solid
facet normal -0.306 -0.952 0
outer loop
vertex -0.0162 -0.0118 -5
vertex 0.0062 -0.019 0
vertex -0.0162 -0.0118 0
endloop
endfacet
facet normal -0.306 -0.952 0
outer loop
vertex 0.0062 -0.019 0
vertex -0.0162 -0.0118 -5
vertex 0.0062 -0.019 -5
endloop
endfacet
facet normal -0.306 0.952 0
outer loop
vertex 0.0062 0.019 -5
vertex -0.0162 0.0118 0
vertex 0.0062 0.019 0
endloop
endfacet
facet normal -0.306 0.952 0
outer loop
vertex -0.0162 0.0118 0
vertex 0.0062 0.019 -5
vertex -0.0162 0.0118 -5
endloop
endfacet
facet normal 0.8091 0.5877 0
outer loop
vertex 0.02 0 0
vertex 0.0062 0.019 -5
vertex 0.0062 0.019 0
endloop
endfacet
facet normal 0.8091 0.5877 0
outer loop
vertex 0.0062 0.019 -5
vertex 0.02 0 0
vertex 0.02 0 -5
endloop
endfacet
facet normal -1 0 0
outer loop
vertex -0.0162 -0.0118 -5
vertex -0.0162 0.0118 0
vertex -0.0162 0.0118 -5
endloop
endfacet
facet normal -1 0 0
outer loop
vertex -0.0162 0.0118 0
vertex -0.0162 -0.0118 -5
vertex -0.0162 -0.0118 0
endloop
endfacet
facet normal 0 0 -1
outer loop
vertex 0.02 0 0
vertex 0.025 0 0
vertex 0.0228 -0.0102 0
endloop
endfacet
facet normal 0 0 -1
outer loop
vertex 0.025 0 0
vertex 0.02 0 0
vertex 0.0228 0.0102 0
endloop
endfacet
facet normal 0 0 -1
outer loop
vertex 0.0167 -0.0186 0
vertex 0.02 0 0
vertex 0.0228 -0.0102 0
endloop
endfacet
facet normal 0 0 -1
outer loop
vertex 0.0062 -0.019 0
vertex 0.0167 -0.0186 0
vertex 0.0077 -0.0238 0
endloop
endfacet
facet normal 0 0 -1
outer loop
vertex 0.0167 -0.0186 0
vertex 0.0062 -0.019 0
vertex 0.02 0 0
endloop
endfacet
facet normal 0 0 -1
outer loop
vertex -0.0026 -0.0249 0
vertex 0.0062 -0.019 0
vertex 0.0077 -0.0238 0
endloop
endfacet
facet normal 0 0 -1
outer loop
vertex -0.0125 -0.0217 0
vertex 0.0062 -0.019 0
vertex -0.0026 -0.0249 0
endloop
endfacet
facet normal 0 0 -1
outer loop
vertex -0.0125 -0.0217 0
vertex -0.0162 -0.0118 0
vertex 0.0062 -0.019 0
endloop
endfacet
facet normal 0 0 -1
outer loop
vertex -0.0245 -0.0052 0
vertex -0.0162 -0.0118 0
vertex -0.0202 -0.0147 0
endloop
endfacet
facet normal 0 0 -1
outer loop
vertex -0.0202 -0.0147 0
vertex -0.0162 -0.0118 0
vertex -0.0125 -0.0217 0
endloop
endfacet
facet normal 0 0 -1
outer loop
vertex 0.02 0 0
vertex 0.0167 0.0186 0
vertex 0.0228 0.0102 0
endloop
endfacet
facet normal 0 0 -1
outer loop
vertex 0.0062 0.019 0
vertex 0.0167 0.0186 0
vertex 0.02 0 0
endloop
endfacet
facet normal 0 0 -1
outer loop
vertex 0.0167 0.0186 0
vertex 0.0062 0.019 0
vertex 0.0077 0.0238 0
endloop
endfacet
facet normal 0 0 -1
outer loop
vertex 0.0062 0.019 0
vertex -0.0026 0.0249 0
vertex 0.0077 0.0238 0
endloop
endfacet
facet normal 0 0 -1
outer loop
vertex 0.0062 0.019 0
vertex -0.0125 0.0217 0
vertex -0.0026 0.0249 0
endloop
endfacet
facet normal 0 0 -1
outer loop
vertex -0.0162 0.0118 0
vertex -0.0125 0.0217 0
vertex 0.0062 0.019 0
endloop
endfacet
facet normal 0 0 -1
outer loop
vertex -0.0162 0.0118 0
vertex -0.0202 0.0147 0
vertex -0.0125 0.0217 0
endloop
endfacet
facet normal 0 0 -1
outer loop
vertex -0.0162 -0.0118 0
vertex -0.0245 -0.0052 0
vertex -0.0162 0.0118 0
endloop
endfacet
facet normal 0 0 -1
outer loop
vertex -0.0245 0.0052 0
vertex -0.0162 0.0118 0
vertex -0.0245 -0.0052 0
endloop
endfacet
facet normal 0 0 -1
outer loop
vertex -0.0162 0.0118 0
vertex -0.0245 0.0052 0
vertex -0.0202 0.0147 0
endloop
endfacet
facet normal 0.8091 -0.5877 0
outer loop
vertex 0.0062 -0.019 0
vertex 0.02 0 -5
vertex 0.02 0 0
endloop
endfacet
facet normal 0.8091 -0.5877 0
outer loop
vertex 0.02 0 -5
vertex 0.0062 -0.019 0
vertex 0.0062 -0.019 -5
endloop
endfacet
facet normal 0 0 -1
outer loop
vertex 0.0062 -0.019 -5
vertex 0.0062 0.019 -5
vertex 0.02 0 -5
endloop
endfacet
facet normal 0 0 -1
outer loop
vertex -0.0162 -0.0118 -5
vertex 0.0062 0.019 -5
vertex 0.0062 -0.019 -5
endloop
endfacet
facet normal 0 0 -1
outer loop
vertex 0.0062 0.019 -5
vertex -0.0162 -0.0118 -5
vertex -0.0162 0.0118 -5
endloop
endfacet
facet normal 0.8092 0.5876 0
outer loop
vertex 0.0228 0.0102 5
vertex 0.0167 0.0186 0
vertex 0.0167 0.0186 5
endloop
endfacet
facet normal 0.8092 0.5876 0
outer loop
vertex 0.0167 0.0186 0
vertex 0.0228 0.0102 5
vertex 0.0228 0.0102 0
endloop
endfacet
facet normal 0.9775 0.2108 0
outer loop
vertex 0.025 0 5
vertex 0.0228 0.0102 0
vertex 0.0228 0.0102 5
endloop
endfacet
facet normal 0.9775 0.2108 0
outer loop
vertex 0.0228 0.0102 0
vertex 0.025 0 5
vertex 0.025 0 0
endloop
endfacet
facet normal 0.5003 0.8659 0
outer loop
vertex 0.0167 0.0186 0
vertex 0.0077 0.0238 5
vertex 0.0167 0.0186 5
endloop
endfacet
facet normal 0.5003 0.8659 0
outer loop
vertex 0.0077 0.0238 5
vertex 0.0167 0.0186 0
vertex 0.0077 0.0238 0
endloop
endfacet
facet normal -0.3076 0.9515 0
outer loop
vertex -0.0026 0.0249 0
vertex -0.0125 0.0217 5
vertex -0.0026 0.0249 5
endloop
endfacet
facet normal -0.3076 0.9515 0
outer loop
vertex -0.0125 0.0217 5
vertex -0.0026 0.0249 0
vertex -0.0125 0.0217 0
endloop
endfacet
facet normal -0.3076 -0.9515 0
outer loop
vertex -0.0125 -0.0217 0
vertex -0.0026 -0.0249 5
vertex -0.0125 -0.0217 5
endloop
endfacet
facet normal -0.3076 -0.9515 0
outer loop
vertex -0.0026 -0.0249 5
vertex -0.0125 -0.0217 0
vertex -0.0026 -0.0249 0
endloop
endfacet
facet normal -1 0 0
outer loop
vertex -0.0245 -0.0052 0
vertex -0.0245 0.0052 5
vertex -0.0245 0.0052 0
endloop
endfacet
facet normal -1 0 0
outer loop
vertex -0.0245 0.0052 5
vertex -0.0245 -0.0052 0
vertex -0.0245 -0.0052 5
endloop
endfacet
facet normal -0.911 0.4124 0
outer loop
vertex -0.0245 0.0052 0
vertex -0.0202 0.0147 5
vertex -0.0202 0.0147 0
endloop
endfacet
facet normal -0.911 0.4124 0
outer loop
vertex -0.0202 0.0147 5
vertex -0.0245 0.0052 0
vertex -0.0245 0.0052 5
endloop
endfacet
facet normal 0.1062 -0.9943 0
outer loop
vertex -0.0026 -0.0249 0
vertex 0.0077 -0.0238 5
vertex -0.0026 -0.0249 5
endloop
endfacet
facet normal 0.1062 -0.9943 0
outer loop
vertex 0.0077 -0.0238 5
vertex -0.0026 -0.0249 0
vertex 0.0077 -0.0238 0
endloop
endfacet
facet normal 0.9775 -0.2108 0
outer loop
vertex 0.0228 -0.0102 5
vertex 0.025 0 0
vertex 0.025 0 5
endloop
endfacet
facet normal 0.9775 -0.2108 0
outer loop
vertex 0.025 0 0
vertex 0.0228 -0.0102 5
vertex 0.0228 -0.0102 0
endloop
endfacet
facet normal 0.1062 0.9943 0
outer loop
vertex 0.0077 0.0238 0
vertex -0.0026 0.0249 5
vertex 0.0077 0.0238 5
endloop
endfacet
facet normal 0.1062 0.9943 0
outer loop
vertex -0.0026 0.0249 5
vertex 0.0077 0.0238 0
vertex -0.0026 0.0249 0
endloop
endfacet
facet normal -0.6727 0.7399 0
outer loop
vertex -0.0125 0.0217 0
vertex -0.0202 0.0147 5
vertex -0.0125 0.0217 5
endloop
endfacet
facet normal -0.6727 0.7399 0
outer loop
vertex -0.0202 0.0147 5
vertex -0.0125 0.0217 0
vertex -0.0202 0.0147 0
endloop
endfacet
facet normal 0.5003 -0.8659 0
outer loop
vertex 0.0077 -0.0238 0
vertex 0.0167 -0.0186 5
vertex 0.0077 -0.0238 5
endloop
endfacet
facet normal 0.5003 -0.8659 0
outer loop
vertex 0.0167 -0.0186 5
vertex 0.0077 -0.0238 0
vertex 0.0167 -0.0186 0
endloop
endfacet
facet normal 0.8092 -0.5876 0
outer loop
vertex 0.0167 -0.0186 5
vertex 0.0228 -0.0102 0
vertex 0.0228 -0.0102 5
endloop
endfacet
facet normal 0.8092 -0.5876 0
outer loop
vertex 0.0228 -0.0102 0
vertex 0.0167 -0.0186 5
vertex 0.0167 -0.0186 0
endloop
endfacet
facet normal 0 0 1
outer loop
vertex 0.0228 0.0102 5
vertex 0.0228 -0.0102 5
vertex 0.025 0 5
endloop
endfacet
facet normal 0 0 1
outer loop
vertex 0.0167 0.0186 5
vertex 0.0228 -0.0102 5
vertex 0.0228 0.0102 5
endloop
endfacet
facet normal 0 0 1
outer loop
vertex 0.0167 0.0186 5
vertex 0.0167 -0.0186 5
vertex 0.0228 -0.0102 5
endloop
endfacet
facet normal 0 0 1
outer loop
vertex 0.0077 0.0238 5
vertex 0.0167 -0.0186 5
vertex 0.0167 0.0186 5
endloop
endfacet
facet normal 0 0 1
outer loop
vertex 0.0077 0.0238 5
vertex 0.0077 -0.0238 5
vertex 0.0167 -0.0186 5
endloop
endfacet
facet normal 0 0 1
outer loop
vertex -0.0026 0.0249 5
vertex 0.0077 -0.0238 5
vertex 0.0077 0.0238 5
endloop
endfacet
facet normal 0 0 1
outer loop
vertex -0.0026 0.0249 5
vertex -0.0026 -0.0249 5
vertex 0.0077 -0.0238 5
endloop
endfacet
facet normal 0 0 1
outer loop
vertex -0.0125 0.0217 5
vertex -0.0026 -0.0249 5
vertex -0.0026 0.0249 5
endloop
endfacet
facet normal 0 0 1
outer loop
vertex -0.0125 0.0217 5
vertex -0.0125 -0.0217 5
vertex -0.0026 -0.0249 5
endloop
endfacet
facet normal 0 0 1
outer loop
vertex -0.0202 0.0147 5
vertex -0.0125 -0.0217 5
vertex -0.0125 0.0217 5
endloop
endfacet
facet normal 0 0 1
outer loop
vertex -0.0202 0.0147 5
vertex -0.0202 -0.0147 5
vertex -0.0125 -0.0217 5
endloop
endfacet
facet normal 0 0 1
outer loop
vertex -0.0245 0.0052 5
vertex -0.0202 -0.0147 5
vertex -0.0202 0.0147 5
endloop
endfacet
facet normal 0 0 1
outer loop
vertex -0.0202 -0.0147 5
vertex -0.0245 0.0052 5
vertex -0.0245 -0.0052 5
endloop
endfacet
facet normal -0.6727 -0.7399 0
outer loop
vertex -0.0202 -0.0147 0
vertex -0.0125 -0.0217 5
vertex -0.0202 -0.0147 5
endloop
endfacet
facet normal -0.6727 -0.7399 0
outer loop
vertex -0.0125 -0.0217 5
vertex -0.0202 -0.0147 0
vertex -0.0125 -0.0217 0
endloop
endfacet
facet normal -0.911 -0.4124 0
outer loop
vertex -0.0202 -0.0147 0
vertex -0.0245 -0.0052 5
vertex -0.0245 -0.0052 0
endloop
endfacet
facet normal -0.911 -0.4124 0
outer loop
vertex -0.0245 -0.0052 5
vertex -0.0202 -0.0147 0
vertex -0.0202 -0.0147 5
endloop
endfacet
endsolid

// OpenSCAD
//use <BOSL/transforms.scad>;

module rotate_about_pt(z, y, pt) {
    translate(pt)
        rotate([0, y, z])
            translate(-pt)
                children();   
}

module scale_about_pt(s, pt) {
    translate(pt)
        scale(s)
            translate(-pt)
                children();   
}

module line_2d(length, start=[0,0], center=false) {
  // linear_extrude(height = .03) translate(start) resize([.03,length]) square(.01);
  if( center ){
    //translate([start[0]+length/2,start[1],0]) 
    rotate([0,-90,0]) cylinder(r=.02, h=length, center=true);
  } else {
    translate([start[0]+length,start[1],0]) 
    rotate([0,-90,0]) cylinder(r=.02, h=length, center=false);
  }
}
roll(90)
line_2d(5,center = false);

module measure_2d(x,y,length) {
  start = [x,y];
// module measure_2d(length,start=[0,0]) {
  rot = [0,0,90];
  % rotate_about_pt(-90,90,start) color("black",.450) {
    translate([start[0]+.055,start[1]-.16]) linear_extrude(height = .03) scale([.3,1.5]) rotate(rot) text("3", size=.3, font="Webdings");
    translate([start[0]+.055,start[1]+length-.42]) linear_extrude(height = .03) scale([.3,1.5]) rotate(rot) text("4", size=.3, font="Webdings");
    line_2d(length-.2, [start[0],start[1]+.1]);
    rotate_about_pt(90,0,start) line_2d(1,[start[0],start[1]-.3]);
    rotate_about_pt(90,0,start) line_2d(1,[start[0]+length,start[1]-.3]);
    translate([start[0]-.25,start[1]+length/2]) linear_extrude(height = .03) rotate(rot) text(str(length),size=.3,font="Arial");
  }
}



module measure_2da(length) {
  start = [-length/2,0];
  rot = [0,0,90];
  % 
    
    //rotate_about_pt(-90,90,start) 
    color("black",.450) {
    translate([start[0]+.055,start[1]-.16]) linear_extrude(height = .03) scale([.3,1.5]) rotate(rot) text("3", size=.3, font="Webdings");
    translate([start[0]+.055,start[1]+length-.42]) linear_extrude(height = .03) scale([.3,1.5]) rotate(rot) text("4", size=.3, font="Webdings");
    line_2d(length-.2, [start[0],start[1]+.1]);
    rotate_about_pt(90,0,start) line_2d(1,[start[0],start[1]-.3]);
    rotate_about_pt(90,0,start) line_2d(1,[start[0]+length,start[1]-.3]);
    translate([start[0]-.25,start[1]+length/2]) linear_extrude(height = .03) rotate(rot) text(str(length),size=.3,font="Arial");
  }
}


module roll(angle, pt) {
  if( is_num(pt) ) {
    translate([pt,0,0]) rotate([0,angle,0]) translate([-pt,0,0])  children(); 
    //translate([0,0,0]) rotate([0,angle,0]) translate([0,0,-pt]) children();   
  } else {
    rotate([0,angle,0]) children();   
  }
}

module up(n) {
  translate([0,0,n]) children();
}

module down(n) {
  translate([0,0,-n]) children();
}

module left(n) {
  translate([-n,0,0]) children();
}

module right(n) {
  translate([n,0,0]) children();
}

module back(n) {
  translate([0,n,0]) children();
}

module forward(n) {
  translate([0,-n,0]) children();
}


//forward(3) up(3) 
// rotate_about_pt(0,90,[1,0,0])
//left(5) forward(3)
  //translate([3.5,0,0]) rotate([0,90,0]) translate([-3.5,0,0]) 
  //measure_2d(1,0,5);
  //measure_2d(1,0,5);

  //up(5) right(3)
  //translate([2.5,0,0]) rotate([0,90,0]) translate([-2.5,0,0]) 
  //measure_2d(0,0,5);

// rotate_about_pt(0,0,[5,1,0]) measure_2d(5,1,25);

// roll(90,2.5)
//translate([2.5,0,0]) rotate([0,90,0]) translate([-2.5,0,0]) 
//translate([2.5,0,0]) rotate([0,0,0]) translate([-2.5,0,0])
//roll(90,2.5)
 //measure_2da(5);

 


 // Find the unitary vector with direction v. Fails if v=[0,0,0].
function unit(v) = norm(v)>0 ? v/norm(v) : undef; 
// Find the transpose of a rectangular matrix
function transpose(m) = // m is any rectangular matrix of objects
  [ for(j=[0:len(m[0])-1]) [ for(i=[0:len(m)-1]) m[i][j] ] ];
// The identity matrix with dimension n
function identity(n) = [for(i=[0:n-1]) [for(j=[0:n-1]) i==j ? 1 : 0] ];

// computes the rotation with minimum angle that brings a to b
// the code fails if a and b are opposed to each other
function rotate_from_to(a,b) = 
    let( axis = unit(cross(a,b)) )
    axis*axis >= 0.99 ? 
        transpose([unit(b), axis, cross(axis, unit(b))]) * 
            [unit(a), axis, cross(axis, unit(a))] : 
        identity(3);


// An application of the minimum rotation
// Given to points p0 and p1, draw a thin cylinder with its
// bases at p0 and p1
module line(p0, p1, diameter=1) {
    v = p1-p0;
    translate(p0)
        // rotate the cylinder so its z axis is brought to direction v
        multmatrix(rotate_from_to([0,0,1],v))
            cylinder(d=diameter, h=norm(v), $fn=15);
}

rotate([0,-90,0]) line([0,0,0], [5,0,0], .05);
